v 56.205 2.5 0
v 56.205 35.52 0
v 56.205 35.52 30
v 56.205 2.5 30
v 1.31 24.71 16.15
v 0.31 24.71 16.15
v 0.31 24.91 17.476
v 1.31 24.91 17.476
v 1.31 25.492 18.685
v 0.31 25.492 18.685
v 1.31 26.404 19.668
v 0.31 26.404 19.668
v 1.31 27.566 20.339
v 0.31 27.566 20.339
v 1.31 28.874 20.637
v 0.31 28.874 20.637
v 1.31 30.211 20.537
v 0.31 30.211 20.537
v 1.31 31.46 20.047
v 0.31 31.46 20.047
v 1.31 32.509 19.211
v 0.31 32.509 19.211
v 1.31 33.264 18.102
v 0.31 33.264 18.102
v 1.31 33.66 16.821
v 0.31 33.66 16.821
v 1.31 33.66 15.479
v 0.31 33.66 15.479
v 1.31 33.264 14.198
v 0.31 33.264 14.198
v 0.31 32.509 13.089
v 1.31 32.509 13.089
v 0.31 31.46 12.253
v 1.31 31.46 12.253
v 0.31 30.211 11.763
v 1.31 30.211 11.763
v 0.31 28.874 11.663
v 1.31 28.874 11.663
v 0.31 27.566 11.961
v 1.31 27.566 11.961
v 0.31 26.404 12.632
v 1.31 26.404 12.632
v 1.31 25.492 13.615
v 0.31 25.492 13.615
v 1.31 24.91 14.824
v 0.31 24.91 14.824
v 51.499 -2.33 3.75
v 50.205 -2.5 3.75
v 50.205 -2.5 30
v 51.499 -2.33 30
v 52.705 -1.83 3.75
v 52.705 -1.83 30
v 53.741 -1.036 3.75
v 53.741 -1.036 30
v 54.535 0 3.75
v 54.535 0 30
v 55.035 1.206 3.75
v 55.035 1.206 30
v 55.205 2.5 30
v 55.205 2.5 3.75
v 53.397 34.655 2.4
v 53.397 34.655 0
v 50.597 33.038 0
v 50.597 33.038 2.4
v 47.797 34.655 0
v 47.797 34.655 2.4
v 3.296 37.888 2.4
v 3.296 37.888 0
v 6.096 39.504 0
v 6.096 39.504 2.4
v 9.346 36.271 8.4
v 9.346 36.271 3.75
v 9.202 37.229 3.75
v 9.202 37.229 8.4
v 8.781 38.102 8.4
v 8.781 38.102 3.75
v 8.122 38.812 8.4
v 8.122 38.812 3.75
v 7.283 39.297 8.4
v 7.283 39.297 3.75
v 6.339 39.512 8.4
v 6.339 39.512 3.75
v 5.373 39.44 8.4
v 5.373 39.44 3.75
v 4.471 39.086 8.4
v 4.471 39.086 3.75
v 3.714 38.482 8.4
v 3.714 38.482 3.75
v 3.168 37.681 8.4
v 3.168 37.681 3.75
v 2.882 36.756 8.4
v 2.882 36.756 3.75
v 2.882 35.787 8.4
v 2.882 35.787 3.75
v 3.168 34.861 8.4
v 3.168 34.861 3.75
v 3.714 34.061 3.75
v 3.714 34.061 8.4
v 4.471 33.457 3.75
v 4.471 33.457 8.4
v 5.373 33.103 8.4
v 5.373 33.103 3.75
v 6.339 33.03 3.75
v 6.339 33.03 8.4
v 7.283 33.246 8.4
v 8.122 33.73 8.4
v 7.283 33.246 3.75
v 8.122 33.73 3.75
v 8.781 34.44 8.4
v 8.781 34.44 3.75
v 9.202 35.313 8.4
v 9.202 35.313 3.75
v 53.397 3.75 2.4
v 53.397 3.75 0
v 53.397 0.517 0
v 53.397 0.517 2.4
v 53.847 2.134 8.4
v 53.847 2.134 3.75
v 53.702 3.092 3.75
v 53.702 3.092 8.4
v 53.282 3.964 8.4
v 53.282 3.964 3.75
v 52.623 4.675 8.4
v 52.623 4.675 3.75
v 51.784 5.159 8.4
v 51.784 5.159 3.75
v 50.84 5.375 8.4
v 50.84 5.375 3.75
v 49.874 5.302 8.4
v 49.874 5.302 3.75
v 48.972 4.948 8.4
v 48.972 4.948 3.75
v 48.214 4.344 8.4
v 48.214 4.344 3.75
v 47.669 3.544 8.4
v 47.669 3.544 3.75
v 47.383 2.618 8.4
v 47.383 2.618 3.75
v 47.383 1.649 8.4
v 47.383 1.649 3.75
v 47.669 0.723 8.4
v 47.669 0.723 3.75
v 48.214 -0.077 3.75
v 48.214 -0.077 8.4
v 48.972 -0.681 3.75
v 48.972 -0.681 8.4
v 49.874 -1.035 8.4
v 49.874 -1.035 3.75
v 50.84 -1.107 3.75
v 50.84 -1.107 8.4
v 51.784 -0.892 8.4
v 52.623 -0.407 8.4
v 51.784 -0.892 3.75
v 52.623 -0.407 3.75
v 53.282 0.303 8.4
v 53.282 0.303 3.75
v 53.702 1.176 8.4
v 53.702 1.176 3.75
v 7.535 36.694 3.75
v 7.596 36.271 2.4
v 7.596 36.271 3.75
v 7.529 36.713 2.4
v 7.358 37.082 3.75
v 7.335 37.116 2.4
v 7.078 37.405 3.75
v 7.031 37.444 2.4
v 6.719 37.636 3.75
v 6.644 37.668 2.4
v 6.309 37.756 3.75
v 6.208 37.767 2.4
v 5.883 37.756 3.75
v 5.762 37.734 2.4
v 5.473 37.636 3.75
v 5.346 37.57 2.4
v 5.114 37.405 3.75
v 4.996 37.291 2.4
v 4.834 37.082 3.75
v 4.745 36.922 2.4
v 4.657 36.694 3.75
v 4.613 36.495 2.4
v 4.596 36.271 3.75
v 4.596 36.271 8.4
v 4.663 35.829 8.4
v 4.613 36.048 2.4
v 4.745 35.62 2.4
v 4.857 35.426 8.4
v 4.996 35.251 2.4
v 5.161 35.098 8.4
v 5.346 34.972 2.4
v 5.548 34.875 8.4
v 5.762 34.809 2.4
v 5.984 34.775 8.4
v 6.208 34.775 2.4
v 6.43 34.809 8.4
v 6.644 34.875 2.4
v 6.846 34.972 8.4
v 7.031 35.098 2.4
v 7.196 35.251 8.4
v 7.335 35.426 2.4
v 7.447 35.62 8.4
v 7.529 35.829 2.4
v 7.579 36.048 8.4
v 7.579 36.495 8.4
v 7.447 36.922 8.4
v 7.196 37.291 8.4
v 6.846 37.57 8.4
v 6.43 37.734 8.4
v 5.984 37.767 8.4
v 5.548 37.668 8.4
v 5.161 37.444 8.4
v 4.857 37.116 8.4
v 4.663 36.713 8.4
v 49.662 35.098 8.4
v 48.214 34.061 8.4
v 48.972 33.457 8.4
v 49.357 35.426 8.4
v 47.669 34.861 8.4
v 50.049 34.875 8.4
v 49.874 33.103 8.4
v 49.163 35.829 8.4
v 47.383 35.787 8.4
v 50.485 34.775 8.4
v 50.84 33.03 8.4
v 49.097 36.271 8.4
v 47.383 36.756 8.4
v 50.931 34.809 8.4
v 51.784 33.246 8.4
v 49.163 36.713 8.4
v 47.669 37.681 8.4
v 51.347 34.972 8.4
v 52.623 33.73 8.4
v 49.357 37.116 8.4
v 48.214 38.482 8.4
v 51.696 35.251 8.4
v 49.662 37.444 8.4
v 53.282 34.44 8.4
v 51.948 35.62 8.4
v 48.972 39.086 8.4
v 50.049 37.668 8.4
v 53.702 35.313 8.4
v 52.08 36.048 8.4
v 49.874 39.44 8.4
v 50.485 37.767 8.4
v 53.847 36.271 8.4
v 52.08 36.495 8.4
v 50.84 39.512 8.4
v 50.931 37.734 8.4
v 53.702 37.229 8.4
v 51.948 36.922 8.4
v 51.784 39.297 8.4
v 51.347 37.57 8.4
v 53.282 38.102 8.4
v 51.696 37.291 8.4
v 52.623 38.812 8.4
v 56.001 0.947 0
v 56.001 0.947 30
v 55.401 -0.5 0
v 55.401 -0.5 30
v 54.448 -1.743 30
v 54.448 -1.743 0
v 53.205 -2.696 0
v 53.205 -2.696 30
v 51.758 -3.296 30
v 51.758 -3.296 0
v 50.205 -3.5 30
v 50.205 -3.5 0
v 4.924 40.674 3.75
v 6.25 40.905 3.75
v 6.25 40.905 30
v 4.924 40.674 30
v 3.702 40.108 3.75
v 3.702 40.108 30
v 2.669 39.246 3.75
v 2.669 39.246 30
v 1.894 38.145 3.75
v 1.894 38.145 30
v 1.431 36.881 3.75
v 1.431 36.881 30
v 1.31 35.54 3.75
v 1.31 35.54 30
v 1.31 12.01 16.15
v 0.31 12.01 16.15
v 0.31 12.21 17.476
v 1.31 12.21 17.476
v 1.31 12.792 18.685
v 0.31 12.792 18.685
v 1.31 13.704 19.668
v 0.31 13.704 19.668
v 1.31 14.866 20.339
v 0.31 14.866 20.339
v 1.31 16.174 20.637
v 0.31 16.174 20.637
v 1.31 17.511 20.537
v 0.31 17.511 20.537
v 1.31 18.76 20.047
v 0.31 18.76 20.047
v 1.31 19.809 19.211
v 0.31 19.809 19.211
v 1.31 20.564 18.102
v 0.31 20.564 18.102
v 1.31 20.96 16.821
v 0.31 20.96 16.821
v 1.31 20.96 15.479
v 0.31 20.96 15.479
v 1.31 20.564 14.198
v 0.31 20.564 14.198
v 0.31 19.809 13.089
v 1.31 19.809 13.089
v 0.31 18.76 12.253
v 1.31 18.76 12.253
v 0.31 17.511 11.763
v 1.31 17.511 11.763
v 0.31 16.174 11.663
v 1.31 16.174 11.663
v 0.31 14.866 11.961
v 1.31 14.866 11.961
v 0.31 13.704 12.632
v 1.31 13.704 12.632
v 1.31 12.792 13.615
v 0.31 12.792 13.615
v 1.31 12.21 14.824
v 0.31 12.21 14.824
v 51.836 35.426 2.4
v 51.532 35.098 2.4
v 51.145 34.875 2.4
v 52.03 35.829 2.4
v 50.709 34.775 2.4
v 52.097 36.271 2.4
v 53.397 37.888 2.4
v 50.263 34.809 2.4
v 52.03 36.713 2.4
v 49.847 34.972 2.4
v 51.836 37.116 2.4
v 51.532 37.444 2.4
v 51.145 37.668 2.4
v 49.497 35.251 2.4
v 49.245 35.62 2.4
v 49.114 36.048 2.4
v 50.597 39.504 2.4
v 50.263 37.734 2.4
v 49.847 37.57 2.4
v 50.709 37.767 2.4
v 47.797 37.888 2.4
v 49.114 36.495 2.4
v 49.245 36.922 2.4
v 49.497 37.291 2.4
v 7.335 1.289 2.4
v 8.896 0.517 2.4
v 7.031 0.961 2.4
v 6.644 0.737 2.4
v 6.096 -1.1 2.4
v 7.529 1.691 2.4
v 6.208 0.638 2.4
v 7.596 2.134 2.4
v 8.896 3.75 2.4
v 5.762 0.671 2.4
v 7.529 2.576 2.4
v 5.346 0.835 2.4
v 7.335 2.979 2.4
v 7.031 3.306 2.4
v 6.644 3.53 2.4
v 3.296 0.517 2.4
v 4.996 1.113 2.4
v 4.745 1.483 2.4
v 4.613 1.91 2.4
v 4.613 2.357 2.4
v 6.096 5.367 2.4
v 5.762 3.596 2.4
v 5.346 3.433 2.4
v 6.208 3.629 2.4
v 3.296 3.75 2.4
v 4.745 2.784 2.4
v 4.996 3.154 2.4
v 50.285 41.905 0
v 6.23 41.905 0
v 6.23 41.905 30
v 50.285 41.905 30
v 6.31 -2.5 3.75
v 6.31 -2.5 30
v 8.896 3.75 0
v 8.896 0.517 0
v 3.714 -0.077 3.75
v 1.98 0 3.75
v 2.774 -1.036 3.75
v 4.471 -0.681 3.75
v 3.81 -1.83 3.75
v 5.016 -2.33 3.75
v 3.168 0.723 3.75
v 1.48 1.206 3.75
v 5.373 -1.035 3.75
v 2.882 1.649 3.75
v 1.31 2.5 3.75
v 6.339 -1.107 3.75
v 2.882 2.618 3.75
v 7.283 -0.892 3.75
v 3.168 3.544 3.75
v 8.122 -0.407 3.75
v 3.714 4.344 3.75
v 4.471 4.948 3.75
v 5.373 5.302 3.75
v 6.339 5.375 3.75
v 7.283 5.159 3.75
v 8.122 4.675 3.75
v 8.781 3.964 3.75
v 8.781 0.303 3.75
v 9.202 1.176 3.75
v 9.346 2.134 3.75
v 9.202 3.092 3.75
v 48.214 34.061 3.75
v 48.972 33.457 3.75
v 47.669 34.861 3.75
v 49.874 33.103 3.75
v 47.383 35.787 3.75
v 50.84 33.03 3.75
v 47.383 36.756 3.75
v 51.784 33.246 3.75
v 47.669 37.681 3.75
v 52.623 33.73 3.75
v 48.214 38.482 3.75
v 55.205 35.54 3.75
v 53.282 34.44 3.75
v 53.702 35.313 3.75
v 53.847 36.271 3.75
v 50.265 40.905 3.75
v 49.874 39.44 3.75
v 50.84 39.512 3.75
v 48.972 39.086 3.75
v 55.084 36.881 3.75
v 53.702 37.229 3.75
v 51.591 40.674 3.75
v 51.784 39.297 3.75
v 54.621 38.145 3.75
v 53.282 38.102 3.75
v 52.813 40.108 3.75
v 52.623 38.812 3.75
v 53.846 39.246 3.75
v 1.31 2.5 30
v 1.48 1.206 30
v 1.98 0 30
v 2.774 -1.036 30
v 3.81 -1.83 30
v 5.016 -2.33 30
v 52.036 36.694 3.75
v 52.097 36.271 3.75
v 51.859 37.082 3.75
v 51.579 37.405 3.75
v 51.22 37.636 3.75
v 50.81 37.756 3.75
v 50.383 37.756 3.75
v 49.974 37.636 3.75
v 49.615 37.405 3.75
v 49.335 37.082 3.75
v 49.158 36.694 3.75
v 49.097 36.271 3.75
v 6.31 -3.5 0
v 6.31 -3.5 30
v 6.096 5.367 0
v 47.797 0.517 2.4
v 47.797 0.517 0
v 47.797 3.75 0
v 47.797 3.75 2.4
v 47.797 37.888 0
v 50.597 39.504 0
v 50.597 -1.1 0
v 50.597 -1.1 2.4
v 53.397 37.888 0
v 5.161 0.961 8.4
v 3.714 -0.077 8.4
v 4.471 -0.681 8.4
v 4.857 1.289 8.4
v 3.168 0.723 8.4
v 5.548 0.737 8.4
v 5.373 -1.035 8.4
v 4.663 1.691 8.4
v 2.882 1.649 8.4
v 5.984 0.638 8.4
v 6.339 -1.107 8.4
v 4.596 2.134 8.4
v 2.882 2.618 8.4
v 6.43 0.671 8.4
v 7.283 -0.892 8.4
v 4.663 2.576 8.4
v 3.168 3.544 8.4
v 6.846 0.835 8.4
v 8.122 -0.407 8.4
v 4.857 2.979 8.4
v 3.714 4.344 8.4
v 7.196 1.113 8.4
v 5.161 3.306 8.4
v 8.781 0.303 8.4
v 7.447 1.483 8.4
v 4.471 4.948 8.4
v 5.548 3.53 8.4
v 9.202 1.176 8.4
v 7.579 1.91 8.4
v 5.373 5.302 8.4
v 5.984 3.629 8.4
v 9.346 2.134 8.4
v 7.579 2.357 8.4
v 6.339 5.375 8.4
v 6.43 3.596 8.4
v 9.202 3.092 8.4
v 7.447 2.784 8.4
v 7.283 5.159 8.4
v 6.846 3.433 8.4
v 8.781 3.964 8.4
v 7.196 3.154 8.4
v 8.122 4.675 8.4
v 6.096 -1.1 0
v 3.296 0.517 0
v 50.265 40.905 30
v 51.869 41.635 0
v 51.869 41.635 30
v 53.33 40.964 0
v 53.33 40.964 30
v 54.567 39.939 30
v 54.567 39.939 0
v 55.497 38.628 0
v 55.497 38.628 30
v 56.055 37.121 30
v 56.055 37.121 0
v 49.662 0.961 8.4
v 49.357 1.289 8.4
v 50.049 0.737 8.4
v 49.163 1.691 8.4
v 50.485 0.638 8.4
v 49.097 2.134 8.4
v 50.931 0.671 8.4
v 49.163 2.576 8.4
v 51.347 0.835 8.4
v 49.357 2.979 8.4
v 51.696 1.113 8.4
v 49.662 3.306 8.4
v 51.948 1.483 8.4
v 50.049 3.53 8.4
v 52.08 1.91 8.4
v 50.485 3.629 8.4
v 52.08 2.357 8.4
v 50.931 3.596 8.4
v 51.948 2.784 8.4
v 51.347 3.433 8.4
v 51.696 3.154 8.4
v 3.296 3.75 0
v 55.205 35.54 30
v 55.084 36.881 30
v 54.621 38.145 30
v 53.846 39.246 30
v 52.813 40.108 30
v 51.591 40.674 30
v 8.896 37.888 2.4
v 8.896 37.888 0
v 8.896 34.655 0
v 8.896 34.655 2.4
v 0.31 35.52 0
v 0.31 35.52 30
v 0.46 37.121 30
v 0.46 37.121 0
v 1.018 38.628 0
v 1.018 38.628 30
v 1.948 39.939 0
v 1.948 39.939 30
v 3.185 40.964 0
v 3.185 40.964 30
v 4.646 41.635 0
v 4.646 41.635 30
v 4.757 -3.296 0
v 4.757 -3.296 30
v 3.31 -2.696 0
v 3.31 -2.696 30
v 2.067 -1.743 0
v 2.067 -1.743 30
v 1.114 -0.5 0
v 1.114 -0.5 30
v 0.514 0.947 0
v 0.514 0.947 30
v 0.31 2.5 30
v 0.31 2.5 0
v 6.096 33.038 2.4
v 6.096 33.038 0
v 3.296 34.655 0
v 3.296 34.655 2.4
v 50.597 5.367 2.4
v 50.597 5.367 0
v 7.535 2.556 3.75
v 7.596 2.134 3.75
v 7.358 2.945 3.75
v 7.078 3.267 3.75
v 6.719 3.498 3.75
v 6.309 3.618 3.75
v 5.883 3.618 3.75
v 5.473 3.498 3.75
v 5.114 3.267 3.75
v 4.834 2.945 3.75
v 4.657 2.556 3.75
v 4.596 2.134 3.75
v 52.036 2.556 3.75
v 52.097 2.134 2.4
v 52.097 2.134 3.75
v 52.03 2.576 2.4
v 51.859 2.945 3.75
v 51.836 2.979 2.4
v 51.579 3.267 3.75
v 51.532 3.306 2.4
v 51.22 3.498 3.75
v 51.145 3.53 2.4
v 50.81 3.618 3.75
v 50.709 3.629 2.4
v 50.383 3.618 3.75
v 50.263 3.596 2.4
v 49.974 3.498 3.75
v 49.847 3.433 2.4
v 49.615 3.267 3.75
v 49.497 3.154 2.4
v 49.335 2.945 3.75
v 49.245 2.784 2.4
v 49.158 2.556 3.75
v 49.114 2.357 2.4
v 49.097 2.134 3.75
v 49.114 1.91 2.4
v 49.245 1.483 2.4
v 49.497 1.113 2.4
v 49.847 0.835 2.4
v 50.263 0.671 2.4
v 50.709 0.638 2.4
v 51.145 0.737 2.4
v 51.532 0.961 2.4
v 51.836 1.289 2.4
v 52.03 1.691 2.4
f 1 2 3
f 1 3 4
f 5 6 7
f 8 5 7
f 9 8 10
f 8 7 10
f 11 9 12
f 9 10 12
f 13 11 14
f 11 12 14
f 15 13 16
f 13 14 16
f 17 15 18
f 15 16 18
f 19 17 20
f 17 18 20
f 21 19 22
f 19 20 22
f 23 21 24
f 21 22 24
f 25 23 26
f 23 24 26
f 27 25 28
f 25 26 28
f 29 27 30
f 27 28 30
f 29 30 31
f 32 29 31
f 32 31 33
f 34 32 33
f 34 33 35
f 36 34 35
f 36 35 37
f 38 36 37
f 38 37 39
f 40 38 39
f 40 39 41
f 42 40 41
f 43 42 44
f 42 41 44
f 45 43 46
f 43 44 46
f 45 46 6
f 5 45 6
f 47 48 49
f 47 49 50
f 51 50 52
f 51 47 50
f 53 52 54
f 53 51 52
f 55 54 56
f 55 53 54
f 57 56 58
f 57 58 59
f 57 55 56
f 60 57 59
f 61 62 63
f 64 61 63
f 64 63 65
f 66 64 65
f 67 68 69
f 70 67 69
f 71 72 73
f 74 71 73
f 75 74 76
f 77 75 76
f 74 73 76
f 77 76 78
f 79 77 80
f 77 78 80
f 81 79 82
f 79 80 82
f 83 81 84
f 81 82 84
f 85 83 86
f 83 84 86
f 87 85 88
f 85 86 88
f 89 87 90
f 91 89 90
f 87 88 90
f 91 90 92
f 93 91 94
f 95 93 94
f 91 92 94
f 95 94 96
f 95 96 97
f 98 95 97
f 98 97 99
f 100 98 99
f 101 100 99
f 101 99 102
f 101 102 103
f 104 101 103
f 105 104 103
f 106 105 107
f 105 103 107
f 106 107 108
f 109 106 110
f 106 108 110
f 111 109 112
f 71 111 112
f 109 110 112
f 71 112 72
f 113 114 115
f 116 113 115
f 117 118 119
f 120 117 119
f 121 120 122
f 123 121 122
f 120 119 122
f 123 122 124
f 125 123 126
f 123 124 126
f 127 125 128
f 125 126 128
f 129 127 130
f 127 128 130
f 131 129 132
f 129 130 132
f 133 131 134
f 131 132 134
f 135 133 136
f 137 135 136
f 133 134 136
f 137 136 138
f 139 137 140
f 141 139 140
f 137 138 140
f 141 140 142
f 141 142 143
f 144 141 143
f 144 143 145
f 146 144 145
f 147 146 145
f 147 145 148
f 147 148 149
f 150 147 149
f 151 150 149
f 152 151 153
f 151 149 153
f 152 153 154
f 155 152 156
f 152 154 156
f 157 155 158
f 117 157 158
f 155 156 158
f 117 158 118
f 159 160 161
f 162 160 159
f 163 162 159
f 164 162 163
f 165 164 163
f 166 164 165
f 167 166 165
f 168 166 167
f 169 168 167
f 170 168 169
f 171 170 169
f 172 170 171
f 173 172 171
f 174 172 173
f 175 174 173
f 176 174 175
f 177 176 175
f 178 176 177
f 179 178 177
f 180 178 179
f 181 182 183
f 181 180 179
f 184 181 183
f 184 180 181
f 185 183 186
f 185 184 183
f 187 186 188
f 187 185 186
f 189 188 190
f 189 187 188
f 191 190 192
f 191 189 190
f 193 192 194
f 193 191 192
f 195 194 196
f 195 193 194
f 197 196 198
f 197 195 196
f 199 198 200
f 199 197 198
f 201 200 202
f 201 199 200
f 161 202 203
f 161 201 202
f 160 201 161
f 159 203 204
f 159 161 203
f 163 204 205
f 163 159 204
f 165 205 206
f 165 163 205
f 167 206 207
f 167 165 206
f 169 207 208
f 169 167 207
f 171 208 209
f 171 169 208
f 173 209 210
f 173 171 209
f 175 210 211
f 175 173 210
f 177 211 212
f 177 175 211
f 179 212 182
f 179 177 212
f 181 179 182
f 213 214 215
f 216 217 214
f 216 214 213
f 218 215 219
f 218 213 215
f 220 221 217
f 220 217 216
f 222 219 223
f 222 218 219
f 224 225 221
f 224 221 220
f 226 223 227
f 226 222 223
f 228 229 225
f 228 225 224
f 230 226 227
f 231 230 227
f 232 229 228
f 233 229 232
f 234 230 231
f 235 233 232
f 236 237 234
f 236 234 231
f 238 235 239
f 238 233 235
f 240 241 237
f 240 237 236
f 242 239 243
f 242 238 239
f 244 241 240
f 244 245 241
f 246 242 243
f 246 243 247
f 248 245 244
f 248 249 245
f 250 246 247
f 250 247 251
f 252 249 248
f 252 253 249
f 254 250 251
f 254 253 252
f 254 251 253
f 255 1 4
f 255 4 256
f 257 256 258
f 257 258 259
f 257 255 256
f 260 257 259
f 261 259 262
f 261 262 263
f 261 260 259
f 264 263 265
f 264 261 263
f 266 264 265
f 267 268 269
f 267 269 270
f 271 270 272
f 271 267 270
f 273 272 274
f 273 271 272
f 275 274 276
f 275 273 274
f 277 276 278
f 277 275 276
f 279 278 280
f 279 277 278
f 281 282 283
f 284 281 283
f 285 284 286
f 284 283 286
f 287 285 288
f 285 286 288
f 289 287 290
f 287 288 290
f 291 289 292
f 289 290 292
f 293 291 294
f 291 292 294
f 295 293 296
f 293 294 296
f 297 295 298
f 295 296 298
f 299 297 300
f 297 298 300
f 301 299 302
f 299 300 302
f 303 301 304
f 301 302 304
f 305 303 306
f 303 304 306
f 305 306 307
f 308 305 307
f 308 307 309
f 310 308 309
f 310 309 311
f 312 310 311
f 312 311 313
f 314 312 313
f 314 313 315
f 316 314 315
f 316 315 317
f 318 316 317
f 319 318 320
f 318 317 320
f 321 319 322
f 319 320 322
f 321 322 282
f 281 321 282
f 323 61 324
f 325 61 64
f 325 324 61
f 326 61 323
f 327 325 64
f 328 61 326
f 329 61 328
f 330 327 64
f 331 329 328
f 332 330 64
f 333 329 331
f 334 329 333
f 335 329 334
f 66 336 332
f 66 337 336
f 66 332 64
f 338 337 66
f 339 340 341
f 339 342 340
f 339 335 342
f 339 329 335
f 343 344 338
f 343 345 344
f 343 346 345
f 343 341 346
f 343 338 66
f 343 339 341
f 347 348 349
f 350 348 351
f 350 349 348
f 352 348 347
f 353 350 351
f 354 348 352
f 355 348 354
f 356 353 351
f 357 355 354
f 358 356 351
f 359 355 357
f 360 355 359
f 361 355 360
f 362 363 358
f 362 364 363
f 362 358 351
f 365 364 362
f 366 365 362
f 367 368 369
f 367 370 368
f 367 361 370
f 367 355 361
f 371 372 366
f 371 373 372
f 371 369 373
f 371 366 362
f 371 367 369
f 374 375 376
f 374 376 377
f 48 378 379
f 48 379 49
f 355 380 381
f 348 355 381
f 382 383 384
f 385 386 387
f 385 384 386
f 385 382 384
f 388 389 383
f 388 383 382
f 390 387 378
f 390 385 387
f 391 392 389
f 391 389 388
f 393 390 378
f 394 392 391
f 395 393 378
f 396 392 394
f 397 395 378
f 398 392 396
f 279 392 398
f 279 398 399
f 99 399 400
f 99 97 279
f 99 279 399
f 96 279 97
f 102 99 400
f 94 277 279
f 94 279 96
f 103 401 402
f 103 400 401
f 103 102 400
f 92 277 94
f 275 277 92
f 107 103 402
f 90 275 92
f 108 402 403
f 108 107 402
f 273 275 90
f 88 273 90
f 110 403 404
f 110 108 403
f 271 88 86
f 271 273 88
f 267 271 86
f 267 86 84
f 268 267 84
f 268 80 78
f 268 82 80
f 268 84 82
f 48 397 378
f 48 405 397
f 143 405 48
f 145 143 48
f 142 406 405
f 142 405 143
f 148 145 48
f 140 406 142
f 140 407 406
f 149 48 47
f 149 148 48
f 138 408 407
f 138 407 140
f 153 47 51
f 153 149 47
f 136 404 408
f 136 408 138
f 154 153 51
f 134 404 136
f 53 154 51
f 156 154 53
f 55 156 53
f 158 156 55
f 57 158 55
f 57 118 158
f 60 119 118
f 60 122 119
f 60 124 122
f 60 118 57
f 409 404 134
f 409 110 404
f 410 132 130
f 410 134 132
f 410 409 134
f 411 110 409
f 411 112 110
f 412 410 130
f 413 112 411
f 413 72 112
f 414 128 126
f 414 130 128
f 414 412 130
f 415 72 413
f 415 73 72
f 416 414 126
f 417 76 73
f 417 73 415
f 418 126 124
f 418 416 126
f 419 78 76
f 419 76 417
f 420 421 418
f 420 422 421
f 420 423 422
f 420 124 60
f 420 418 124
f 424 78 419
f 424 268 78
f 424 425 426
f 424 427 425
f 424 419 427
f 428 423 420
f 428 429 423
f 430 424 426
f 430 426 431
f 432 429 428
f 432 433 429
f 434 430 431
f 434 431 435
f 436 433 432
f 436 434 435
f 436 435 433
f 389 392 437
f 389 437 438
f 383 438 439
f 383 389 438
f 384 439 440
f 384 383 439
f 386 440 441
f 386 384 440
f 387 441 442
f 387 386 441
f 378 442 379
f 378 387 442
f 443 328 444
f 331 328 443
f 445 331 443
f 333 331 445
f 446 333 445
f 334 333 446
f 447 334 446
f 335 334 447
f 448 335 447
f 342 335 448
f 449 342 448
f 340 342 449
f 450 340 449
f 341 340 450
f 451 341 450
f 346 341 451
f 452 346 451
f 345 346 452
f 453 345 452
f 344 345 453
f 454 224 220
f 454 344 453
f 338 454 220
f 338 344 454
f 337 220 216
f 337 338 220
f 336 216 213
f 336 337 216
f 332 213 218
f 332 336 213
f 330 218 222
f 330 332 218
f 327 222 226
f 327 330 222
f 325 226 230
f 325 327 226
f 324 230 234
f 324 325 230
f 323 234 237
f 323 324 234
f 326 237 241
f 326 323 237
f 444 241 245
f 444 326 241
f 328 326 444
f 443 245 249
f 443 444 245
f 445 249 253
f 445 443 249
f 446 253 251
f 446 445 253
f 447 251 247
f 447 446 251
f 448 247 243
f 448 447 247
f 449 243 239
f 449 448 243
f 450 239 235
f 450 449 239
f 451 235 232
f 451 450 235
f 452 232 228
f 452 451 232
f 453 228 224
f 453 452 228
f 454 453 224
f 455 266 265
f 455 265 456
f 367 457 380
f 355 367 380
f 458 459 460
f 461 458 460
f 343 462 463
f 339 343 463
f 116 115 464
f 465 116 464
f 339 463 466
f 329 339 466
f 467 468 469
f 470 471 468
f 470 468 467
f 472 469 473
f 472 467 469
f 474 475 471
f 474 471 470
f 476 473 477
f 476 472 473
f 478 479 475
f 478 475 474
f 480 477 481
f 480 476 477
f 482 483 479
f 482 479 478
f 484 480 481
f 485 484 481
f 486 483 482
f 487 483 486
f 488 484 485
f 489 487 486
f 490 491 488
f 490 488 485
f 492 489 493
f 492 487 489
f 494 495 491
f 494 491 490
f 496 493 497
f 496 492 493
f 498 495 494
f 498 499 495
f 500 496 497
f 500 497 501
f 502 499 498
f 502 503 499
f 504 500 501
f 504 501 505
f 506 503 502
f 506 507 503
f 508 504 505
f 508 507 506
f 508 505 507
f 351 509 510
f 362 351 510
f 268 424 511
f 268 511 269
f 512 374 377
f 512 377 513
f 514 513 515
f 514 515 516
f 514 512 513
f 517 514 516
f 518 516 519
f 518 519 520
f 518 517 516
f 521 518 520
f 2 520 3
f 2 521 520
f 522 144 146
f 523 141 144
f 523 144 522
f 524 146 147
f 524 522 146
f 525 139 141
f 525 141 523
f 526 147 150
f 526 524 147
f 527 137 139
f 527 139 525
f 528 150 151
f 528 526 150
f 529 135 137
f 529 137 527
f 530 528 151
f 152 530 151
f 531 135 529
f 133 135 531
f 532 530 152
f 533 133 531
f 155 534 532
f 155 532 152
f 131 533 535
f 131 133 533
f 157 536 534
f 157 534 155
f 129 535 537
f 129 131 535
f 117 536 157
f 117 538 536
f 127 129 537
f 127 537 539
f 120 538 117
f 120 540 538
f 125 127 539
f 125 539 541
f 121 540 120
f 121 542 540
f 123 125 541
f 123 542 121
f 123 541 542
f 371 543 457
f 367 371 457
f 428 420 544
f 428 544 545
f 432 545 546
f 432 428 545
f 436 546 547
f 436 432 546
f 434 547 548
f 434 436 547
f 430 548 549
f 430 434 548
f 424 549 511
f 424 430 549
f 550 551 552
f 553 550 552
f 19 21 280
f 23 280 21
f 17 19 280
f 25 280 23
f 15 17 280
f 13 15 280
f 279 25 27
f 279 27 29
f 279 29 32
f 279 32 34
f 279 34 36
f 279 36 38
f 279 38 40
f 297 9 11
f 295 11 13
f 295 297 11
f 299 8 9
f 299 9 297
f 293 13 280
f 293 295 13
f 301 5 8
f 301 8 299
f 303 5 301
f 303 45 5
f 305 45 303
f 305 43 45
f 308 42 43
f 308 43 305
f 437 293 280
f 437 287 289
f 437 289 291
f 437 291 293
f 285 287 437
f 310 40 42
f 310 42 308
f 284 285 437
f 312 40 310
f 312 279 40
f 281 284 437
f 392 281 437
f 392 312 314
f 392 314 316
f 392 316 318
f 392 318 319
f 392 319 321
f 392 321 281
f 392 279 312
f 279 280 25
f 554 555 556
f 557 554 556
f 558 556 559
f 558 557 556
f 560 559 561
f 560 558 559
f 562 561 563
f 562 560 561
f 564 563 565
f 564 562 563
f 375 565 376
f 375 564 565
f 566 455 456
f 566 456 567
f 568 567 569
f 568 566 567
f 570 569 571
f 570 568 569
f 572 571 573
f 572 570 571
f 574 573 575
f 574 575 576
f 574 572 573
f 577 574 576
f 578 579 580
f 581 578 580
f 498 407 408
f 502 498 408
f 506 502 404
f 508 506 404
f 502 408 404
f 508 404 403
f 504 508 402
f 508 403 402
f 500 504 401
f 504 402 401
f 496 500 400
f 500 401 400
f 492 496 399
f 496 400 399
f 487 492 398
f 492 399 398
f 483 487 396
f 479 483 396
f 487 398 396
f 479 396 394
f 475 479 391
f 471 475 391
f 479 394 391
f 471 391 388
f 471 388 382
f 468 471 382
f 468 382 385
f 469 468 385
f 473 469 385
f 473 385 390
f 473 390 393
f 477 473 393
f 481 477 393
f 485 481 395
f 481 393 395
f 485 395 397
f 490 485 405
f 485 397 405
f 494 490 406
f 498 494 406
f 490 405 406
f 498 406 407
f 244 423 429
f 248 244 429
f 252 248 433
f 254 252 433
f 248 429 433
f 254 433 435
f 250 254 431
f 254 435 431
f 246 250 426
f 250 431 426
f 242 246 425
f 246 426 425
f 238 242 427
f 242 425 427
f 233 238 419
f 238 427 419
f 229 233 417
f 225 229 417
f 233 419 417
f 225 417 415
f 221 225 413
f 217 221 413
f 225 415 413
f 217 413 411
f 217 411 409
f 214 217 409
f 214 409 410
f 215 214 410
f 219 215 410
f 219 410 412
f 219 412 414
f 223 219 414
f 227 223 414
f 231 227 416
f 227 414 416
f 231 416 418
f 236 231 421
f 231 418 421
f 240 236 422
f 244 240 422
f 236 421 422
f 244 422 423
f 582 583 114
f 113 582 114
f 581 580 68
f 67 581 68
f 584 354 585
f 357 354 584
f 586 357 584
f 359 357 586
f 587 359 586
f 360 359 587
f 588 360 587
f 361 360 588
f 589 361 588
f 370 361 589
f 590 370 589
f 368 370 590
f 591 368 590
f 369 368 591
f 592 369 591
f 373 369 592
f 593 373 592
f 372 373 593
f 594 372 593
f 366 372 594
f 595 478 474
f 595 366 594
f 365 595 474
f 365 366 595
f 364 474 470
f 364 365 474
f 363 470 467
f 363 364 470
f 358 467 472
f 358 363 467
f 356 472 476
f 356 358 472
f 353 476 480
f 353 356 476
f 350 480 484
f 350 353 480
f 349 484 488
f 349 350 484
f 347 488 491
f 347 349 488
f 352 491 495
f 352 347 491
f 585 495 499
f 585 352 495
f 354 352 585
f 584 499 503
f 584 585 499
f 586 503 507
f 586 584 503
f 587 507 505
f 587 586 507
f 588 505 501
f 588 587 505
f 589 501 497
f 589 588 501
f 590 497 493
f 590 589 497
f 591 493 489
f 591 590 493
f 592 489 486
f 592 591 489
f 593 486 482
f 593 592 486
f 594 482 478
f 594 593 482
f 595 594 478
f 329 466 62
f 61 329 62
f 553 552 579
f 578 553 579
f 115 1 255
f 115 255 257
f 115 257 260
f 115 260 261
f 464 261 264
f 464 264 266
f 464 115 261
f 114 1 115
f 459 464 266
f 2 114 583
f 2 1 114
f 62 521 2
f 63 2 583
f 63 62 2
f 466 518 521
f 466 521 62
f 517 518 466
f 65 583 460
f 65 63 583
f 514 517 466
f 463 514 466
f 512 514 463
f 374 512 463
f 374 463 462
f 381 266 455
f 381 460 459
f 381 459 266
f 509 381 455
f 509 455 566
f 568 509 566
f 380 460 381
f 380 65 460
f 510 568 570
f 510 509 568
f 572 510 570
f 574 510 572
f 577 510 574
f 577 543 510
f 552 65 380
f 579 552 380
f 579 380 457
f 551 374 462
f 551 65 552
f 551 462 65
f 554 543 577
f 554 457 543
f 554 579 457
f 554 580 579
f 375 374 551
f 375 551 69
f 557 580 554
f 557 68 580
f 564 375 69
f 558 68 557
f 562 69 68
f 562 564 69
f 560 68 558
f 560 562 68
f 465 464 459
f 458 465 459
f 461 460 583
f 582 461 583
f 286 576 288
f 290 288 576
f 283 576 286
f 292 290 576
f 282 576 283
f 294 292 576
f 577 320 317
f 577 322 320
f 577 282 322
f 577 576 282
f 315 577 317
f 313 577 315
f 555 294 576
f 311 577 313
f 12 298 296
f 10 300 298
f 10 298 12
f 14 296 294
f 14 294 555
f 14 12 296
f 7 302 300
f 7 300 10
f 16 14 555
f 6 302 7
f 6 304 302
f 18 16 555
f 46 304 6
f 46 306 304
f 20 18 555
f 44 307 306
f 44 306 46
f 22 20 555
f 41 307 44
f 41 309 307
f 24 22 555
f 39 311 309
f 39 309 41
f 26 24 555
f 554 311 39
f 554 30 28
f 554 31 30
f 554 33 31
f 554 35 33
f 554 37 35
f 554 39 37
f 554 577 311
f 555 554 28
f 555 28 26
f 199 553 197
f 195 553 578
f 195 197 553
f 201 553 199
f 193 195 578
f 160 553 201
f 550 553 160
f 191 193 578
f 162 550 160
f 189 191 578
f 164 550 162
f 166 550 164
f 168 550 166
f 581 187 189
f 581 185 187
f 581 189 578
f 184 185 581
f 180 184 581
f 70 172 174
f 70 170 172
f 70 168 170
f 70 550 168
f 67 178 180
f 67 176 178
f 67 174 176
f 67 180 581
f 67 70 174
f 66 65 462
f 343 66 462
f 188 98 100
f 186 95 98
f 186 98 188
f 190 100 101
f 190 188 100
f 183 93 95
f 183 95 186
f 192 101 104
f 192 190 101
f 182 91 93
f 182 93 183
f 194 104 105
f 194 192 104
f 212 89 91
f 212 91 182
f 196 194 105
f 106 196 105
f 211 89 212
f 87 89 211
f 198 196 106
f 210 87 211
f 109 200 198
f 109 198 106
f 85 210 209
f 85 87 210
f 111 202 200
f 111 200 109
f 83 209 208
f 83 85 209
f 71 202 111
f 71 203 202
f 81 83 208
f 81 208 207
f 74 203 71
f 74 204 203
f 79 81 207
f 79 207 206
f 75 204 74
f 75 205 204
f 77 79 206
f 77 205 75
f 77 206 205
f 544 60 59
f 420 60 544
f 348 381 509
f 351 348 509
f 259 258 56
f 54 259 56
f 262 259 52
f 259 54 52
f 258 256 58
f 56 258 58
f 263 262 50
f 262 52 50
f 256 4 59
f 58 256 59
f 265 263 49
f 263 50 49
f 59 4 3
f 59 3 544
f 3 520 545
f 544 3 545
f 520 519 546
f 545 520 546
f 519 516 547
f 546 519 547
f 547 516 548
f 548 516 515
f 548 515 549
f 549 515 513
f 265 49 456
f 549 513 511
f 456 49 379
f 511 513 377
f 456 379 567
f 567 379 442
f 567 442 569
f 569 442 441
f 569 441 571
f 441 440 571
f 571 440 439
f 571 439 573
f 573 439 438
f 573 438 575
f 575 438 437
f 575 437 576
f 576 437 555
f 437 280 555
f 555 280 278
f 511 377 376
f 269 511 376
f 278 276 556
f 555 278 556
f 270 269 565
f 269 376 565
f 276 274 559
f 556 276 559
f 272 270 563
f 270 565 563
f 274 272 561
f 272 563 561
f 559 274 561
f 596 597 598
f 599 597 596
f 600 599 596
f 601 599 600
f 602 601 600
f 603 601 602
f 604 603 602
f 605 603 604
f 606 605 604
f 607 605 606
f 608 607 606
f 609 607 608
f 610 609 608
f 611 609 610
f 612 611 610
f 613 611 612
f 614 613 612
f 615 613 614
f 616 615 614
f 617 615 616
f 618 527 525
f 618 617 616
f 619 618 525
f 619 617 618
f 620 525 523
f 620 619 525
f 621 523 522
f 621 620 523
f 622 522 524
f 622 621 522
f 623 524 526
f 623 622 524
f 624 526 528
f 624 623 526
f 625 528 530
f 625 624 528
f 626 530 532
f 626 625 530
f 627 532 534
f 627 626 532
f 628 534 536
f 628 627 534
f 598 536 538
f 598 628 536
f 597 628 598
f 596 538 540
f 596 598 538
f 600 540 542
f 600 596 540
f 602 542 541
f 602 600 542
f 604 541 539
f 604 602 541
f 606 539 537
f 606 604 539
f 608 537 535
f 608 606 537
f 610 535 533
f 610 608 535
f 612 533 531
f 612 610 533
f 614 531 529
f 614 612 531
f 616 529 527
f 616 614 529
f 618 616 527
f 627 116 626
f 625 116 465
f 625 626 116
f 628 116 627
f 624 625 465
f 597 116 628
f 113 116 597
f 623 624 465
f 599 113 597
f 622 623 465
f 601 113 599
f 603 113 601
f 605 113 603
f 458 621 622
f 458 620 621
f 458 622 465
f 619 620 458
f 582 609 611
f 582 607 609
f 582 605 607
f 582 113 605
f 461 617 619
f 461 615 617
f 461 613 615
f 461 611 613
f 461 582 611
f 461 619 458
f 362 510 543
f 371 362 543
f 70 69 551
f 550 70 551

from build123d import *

# Parameters (mm, degrees)
SKETCH1_R           = 1.5
BOSS_EXTRUDE2_DEPTH = 3.75
BOSS_EXTRUDE3_DEPTH = 30
CUT_EXTRUDE1_DEPTH  = 2.4
SKETCH3_R           = 3.25
SKETCH3_R_2         = 1.5
BOSS_EXTRUDE4_DEPTH = 4.65
SKETCH4_R           = 4.5
CUT_EXTRUDE2_DEPTH  = 1


with BuildPart() as part:
    # Sketch1 → Boss-Extrude2 (new body)
    # profile 1 of 2: a face of its own
    with BuildSketch(Plane.XY):
        with BuildLine():
            Line((55.205, 35.540044664), (55.205, 2.5))
            ThreePointArc((55.205, 2.5), (53.740533906, -1.035533906), (50.205, -2.5))
            Line((50.205, -2.5), (6.31, -2.5))
            ThreePointArc((6.31, -2.5), (2.774466094, -1.035533906), (1.31, 2.5))
            Line((1.31, 2.5), (1.31, 35.540044664))
            ThreePointArc((1.31, 35.540044664), (2.66894591, 39.245525041), (6.250024717, 40.9048))
            Line((6.250024717, 40.9048), (50.264975283, 40.9048))
            ThreePointArc((50.264975283, 40.9048), (53.84605409, 39.245525041), (55.205, 35.540044664))
        make_face()
        with BuildLine():
            ThreePointArc((3.81, 2.5), (4.542233047, 0.732233047), (6.31, 0))
            Line((6.31, 0), (50.205, 0))
            ThreePointArc((50.205, 0), (51.972766953, 0.732233047), (52.705, 2.5))
            Line((52.705, 2.5), (52.705, 35.6))
            ThreePointArc((52.705, 35.6), (52.03588526, 37.520159965), (50.205, 38.4048))
            Line((50.205, 38.4048), (6.31, 38.4048))
            ThreePointArc((6.31, 38.4048), (4.47911474, 37.520159965), (3.81, 35.6))
            Line((3.81, 35.6), (3.81, 2.5))
        make_face(mode=Mode.SUBTRACT)
    # profile 2 of 2: a face of its own
    with BuildSketch(Plane.XY):
        with BuildLine():
            Line((3.81, 35.6), (3.81, 2.5))
            ThreePointArc((3.81, 2.5), (4.542233047, 0.732233047), (6.31, 0))
            Line((6.31, 0), (50.205, 0))
            ThreePointArc((50.205, 0), (51.972766953, 0.732233047), (52.705, 2.5))
            Line((52.705, 2.5), (52.705, 35.6))
            ThreePointArc((52.705, 35.6), (52.03588526, 37.520159965), (50.205, 38.4048))
            Line((50.205, 38.4048), (6.31, 38.4048))
            ThreePointArc((6.31, 38.4048), (4.47911474, 37.520159965), (3.81, 35.6))
        make_face()
        with Locations((6.096, 36.2712)):
            Circle(SKETCH1_R, mode=Mode.SUBTRACT)
        with Locations((50.5968, 36.2712)):
            Circle(SKETCH1_R, mode=Mode.SUBTRACT)
        with Locations((50.5968, 2.1336)):
            Circle(SKETCH1_R, mode=Mode.SUBTRACT)
        with Locations((6.096, 2.1336)):
            Circle(SKETCH1_R, mode=Mode.SUBTRACT)
    extrude(amount=BOSS_EXTRUDE2_DEPTH)

    # Sketch1<3> → Boss-Extrude3 (add)
    with BuildSketch(Plane.XY):
        with BuildLine():
            Line((56.205, 35.52036079), (56.205, 2.5))
            ThreePointArc((56.205, 2.5), (54.447640687, -1.742640687), (50.205, -3.5))
            Line((50.205, -3.5), (6.31, -3.5))
            ThreePointArc((6.31, -3.5), (2.067359313, -1.742640687), (0.31, 2.5))
            Line((0.31, 2.5), (0.31, 35.52036079))
            ThreePointArc((0.31, 35.52036079), (1.947918213, 39.938710907), (6.230334295, 41.9048))
            Line((6.230334295, 41.9048), (50.284665705, 41.9048))
            ThreePointArc((50.284665705, 41.9048), (54.567081787, 39.938710907), (56.205, 35.52036079))
        make_face()
        with BuildLine():
            ThreePointArc((55.205, 35.540044664), (53.84605409, 39.245525041), (50.264975283, 40.9048))
            Line((50.264975283, 40.9048), (6.250024717, 40.9048))
            ThreePointArc((6.250024717, 40.9048), (2.66894591, 39.245525041), (1.31, 35.540044664))
            Line((1.31, 35.540044664), (1.31, 2.5))
            ThreePointArc((1.31, 2.5), (2.774466094, -1.035533906), (6.31, -2.5))
            Line((6.31, -2.5), (50.205, -2.5))
            ThreePointArc((50.205, -2.5), (53.740533906, -1.035533906), (55.205, 2.5))
            Line((55.205, 2.5), (55.205, 35.540044664))
        make_face(mode=Mode.SUBTRACT)
    extrude(amount=BOSS_EXTRUDE3_DEPTH)

    # Sketch2 → Cut-Extrude1 (cut)
    with BuildSketch(Plane(origin=(0, 0, 0), x_dir=(-1, 0, 0), z_dir=(0, 0, -1))):
        Polygon((-50.5968, 5.366761507), (-53.3968, 3.750180754), (-53.3968, 0.517019246), (-50.5968, -1.099561507), (-47.7968, 0.517019246), (-47.7968, 3.750180754), align=None)
        Polygon((-47.7968, 37.887780754), (-50.5968, 39.504361507), (-53.3968, 37.887780754), (-53.3968, 34.654619246), (-50.5968, 33.038038493), (-47.7968, 34.654619246), align=None)
        Polygon((-6.096, 39.504361507), (-8.896, 37.887780754), (-8.896, 34.654619246), (-6.096, 33.038038493), (-3.296, 34.654619246), (-3.296, 37.887780754), align=None)
        Polygon((-6.096, 5.366761507), (-8.896, 3.750180754), (-8.896, 0.517019246), (-6.096, -1.099561507), (-3.296, 0.517019246), (-3.296, 3.750180754), align=None)
    extrude(amount=-CUT_EXTRUDE1_DEPTH, mode=Mode.SUBTRACT)

    # Sketch3 → Boss-Extrude4 (add)
    # profile 1 of 4: a face of its own
    with BuildSketch(Plane.XY.offset(3.75)):
        with Locations((6.096, 36.2712)):
            Circle(SKETCH3_R)
        with Locations(Location((6.096, 36.2712, 0), (0, 0, 180))):
            Circle(SKETCH3_R_2, mode=Mode.SUBTRACT)
    # profile 2 of 4: a face of its own
    with BuildSketch(Plane.XY.offset(3.75)):
        with Locations((6.096, 2.1336)):
            Circle(SKETCH3_R)
        with Locations(Location((6.096, 2.1336, 0), (0, 0, 180))):
            Circle(SKETCH3_R_2, mode=Mode.SUBTRACT)
    # profile 3 of 4: a face of its own
    with BuildSketch(Plane.XY.offset(3.75)):
        with Locations((50.5968, 2.1336)):
            Circle(SKETCH3_R)
        with Locations(Location((50.5968, 2.1336, 0), (0, 0, 180))):
            Circle(SKETCH3_R_2, mode=Mode.SUBTRACT)
    # profile 4 of 4: a face of its own
    with BuildSketch(Plane.XY.offset(3.75)):
        with Locations((50.5968, 36.2712)):
            Circle(SKETCH3_R)
        with Locations(Location((50.5968, 36.2712, 0), (0, 0, 180))):
            Circle(SKETCH3_R_2, mode=Mode.SUBTRACT)
    extrude(amount=BOSS_EXTRUDE4_DEPTH)

    # Sketch4 → Cut-Extrude2 (cut)
    with BuildSketch(Plane.ZY.offset(-0.31)):
        with Locations(Location((16.15, 29.21, 0), (0, 0, 270))):
            Circle(SKETCH4_R)
        with Locations(Location((16.15, 16.51, 0), (0, 0, 270))):
            Circle(SKETCH4_R)
    extrude(amount=-CUT_EXTRUDE2_DEPTH, mode=Mode.SUBTRACT)


solid = part.part
